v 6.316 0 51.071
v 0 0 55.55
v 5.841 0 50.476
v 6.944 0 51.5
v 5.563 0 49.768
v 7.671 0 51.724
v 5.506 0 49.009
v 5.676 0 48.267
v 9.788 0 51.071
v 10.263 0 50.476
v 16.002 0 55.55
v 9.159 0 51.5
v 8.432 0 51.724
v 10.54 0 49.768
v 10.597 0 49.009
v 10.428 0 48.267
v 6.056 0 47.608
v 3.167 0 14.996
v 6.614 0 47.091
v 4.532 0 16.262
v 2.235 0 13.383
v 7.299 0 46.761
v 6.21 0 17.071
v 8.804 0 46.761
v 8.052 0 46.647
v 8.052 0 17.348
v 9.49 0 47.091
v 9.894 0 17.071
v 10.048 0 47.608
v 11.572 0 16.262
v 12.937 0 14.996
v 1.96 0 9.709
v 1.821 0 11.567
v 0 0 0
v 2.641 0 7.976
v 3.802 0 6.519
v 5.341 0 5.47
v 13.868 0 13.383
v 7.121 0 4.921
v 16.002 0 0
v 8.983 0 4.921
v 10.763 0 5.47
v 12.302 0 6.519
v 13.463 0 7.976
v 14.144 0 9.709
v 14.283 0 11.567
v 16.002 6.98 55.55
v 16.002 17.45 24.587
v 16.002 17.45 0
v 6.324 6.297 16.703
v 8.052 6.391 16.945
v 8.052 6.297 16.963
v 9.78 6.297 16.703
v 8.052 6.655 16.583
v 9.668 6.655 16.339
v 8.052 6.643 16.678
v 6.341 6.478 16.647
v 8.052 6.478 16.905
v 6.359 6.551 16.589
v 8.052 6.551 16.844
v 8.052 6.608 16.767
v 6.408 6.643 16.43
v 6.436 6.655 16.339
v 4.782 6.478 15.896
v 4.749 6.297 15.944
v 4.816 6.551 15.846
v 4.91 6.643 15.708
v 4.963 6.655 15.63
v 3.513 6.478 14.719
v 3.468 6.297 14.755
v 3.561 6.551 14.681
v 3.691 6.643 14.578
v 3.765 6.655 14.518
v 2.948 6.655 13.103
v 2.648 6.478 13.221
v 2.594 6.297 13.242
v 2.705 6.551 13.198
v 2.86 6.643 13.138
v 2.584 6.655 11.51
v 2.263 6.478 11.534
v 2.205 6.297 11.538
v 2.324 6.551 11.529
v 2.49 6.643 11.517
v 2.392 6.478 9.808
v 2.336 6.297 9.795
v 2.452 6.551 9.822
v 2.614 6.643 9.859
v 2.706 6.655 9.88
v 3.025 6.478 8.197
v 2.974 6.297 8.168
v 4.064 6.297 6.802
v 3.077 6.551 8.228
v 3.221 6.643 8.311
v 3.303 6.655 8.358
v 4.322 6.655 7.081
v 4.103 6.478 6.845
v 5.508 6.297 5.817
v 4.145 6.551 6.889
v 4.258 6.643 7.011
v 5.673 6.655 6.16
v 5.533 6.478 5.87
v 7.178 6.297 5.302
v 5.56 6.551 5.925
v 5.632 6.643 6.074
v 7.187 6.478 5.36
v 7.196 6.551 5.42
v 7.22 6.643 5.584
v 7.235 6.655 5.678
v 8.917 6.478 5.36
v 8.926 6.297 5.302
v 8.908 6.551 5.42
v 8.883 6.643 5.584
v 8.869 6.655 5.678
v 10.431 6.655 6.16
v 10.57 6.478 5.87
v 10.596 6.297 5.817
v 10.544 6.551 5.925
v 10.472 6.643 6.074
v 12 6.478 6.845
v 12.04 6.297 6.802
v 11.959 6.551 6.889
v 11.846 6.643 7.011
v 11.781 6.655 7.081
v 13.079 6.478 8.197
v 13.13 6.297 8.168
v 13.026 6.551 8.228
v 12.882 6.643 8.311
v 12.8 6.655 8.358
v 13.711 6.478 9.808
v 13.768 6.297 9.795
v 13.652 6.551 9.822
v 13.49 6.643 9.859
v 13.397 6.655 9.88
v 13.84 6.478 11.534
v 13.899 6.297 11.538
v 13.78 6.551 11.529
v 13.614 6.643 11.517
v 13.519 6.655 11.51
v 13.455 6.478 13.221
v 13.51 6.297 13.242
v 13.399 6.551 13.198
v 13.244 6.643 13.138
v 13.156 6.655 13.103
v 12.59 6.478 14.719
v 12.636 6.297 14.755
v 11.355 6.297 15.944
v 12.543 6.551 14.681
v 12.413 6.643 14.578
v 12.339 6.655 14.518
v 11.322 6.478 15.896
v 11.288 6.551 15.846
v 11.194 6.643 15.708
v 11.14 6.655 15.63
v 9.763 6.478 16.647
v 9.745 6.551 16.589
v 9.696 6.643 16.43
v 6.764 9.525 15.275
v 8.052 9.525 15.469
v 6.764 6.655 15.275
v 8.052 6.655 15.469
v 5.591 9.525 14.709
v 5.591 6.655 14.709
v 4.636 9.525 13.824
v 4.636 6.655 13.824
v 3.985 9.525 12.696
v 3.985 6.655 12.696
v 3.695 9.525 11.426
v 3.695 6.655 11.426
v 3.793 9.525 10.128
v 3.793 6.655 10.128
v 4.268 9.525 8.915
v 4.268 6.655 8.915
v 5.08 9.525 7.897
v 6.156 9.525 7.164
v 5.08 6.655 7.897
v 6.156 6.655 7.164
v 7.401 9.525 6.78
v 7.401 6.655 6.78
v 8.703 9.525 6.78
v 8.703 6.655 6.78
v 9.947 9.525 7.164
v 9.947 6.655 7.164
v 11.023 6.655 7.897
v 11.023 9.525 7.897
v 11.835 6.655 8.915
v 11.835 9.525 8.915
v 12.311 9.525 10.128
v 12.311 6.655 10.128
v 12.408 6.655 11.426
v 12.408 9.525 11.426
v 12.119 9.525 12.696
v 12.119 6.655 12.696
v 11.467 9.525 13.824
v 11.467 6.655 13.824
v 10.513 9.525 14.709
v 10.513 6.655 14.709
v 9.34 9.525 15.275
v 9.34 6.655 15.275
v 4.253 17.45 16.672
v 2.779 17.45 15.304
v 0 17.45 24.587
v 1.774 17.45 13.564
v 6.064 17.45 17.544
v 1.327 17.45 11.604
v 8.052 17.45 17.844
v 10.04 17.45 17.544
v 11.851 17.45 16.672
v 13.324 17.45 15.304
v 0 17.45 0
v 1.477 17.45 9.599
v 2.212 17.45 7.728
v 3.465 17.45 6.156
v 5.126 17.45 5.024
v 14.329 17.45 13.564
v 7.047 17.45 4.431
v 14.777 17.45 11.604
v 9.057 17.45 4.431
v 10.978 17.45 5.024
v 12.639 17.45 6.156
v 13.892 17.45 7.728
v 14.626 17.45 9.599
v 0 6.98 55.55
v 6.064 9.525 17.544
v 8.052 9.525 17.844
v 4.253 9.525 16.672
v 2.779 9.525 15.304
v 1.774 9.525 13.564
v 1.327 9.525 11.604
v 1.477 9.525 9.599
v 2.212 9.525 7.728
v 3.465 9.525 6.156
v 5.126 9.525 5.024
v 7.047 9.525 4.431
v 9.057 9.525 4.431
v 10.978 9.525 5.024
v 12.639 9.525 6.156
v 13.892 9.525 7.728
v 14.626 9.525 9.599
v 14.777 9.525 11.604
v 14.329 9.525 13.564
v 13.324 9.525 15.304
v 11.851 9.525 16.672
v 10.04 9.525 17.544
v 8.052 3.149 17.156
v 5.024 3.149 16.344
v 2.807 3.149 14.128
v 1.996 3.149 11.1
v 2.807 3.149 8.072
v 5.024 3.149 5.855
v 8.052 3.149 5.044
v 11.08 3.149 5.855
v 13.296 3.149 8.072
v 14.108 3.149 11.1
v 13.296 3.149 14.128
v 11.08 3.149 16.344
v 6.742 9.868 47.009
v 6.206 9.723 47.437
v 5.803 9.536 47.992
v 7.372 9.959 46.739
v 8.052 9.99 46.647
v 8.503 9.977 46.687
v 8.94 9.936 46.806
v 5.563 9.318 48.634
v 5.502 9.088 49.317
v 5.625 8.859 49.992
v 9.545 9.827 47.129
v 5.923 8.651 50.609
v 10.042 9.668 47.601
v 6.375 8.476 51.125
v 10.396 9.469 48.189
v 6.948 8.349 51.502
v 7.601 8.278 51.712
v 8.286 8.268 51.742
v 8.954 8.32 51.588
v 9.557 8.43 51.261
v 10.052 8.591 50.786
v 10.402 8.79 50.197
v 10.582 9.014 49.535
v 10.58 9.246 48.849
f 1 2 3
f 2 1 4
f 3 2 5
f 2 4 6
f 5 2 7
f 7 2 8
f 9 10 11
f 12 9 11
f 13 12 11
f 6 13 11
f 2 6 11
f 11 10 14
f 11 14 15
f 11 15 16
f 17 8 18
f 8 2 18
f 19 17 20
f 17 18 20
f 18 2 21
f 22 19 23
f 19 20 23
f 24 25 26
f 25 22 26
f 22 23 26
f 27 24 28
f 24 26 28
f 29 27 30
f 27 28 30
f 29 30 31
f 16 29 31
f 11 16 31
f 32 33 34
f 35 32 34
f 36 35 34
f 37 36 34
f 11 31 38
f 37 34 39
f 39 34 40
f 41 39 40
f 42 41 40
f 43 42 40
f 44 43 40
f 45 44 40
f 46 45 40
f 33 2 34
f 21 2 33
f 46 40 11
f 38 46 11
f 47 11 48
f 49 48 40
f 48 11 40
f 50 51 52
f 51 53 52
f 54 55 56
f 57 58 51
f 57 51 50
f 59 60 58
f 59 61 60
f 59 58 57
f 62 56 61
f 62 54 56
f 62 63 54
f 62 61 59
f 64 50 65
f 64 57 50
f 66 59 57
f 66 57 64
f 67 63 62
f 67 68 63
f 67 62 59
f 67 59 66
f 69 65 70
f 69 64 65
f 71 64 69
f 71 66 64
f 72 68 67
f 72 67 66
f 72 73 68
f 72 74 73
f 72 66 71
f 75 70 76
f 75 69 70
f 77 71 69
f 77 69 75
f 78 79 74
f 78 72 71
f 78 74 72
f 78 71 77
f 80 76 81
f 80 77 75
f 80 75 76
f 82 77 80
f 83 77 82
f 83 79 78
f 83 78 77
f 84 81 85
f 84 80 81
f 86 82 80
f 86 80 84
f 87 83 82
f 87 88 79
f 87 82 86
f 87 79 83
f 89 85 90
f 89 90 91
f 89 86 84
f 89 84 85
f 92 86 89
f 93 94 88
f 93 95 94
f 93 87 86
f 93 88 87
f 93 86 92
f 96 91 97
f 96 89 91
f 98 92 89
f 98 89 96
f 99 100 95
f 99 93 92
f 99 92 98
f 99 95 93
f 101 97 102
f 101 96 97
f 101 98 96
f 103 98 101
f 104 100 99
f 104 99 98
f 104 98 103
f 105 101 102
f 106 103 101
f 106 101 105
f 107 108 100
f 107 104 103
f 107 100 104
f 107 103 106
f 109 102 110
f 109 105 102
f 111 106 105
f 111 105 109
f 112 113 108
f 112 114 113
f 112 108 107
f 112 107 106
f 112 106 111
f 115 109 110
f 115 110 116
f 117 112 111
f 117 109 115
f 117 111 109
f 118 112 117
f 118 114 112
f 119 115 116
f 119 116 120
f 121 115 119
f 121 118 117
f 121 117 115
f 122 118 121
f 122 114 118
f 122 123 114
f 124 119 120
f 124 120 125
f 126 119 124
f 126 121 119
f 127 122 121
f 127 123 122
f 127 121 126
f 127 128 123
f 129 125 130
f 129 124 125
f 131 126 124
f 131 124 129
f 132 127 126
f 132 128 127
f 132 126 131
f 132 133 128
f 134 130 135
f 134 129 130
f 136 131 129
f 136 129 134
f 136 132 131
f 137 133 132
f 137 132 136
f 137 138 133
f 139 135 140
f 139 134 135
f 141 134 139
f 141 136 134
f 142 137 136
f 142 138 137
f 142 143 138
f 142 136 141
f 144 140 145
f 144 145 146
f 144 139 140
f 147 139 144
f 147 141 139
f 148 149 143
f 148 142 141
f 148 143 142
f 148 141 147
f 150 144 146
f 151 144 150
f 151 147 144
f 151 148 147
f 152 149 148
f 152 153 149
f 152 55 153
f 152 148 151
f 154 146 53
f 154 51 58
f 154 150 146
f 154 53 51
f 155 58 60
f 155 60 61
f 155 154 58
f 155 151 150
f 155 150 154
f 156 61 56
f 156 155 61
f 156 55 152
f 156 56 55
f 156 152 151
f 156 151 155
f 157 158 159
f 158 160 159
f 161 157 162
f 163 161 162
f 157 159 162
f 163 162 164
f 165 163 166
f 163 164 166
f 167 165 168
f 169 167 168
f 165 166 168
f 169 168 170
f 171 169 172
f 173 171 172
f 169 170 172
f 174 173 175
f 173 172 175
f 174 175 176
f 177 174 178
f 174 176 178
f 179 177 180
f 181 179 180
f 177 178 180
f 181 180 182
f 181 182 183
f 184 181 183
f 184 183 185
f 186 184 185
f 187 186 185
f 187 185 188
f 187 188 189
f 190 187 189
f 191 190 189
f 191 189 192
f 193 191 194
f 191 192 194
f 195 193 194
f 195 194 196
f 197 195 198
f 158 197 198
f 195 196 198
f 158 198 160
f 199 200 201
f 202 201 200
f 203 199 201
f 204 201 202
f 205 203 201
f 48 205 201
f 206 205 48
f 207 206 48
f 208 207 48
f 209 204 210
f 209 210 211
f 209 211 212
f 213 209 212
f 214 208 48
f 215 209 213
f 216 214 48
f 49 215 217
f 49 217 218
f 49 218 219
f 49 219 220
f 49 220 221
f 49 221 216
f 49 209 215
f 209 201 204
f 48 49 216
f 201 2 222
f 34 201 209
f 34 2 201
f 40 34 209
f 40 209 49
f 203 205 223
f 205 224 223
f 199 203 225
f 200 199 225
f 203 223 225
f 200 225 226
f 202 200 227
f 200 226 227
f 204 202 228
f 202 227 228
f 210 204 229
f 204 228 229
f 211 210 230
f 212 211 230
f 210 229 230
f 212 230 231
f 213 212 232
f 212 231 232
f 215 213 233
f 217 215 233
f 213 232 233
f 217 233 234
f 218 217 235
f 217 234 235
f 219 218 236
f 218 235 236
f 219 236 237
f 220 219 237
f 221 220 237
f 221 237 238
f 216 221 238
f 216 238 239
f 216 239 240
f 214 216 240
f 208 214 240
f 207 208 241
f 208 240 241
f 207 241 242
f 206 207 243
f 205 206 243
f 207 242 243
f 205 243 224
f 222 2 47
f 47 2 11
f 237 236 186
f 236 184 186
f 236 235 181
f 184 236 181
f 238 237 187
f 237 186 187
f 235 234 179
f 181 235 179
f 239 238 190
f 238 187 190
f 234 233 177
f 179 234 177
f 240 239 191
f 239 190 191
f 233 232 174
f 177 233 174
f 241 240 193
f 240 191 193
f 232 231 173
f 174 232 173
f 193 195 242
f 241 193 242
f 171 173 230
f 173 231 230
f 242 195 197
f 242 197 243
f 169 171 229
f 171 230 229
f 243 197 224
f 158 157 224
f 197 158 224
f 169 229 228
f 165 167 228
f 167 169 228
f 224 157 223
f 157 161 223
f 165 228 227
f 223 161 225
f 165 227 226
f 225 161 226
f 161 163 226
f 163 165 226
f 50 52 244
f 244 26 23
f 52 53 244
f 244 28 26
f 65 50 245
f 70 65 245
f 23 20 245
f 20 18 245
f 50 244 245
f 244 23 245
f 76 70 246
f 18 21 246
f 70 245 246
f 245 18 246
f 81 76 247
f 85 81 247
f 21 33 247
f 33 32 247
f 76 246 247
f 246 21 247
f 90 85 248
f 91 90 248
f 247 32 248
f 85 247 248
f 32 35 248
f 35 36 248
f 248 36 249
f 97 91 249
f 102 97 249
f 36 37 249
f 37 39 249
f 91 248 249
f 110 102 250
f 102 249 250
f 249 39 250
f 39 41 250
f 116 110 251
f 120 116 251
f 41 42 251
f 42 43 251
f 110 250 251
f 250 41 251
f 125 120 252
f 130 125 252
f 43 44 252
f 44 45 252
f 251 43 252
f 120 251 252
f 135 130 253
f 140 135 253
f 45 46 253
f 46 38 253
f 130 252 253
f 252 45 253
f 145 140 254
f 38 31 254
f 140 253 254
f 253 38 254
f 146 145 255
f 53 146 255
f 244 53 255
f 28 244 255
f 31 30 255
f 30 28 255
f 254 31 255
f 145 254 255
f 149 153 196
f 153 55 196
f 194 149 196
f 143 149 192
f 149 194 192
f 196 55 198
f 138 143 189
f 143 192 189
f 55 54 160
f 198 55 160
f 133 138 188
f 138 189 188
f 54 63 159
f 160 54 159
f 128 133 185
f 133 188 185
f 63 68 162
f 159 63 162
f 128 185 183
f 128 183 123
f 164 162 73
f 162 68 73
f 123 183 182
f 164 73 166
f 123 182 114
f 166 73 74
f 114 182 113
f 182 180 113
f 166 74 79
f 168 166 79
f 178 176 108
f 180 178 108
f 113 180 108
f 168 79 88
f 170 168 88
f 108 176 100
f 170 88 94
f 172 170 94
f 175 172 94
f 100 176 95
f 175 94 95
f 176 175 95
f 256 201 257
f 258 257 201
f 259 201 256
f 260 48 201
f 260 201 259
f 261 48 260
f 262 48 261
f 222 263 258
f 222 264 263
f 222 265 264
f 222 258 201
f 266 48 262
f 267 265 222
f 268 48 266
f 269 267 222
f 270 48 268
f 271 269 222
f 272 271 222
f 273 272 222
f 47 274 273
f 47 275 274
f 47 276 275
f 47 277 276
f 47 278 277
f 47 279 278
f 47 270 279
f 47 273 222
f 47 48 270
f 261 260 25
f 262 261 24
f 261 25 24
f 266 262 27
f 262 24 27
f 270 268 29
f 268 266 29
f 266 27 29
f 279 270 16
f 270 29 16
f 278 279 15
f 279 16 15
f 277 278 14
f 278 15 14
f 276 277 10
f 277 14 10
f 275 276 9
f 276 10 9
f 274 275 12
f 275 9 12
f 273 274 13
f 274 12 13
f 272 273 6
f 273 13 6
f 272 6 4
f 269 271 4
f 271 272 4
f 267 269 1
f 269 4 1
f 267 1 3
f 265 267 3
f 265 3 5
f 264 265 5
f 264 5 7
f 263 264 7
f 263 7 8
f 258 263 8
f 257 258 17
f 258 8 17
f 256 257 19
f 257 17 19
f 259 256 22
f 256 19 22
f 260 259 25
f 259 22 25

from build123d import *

# Parameters (mm, degrees)
SKETCH1_W          = 16.002
SKETCH1_H          = 55.5498
EXTRUDE1_DEPTH     = 17.4498
FILLET1_R          = 0.381
CUT_EXTRUDE1_DEPTH = 17.002
SKETCH5_R          = 2.5527
CUT_EXTRUDE2_DEPTH = 18.4498


with BuildPart() as part:
    # Sketch1 → Extrude1 (new body)
    with BuildSketch(Plane(origin=(0, 0, 0), x_dir=(1, 0, 0), z_dir=(0, 1, 0))):
        with Locations((8.001, -27.7749)):
            Rectangle(SKETCH1_W, SKETCH1_H)
    extrude(amount=EXTRUDE1_DEPTH)

    # Sketch3 → Cut-Revolve1 (revolve, cut)
    with BuildSketch(Plane(origin=(8.0518, 0, 0), x_dir=(0, 0, -1), z_dir=(1, 0, 0))):
        Polygon((-17.8435, 17.4498), (-17.8435, 9.525), (-15.4686, 9.525), (-15.4686, 6.6548), (-16.941174995, 6.6548), (-17.3482, 0), (-11.0998, 0), (-11.0998, 17.4498), align=None)
    revolve(axis=Axis((8.0518, 31.679444444, 11.0998), (0, -1, 0)), mode=Mode.SUBTRACT)

    # Fillet1
    fillet1_edges = [part.edges().sort_by_distance(p)[0] for p in [
        (8.0518, 6.6548, 5.258425005),
    ]]
    fillet(fillet1_edges, radius=FILLET1_R)

    # Sketch4 → Cut-Extrude1 (cut, through all)
    with BuildSketch(Plane(origin=(16.002, 0, 0), x_dir=(0, 0, -1), z_dir=(1, 0, 0))):
        Polygon((-55.5498, 6.97992), (-55.5498, 17.4498), (-24.5872, 17.4498), align=None)
    extrude(amount=-CUT_EXTRUDE1_DEPTH, mode=Mode.SUBTRACT)

    # Sketch5 → Cut-Extrude2 (cut, through all)
    with BuildSketch(Plane.XZ):
        with Locations(Location((8.0518, 49.1998, 0), (0, 0, 270))):  # turned: the seam where the file's is
            Circle(SKETCH5_R)
    extrude(amount=-CUT_EXTRUDE2_DEPTH, mode=Mode.SUBTRACT)


solid = part.part
